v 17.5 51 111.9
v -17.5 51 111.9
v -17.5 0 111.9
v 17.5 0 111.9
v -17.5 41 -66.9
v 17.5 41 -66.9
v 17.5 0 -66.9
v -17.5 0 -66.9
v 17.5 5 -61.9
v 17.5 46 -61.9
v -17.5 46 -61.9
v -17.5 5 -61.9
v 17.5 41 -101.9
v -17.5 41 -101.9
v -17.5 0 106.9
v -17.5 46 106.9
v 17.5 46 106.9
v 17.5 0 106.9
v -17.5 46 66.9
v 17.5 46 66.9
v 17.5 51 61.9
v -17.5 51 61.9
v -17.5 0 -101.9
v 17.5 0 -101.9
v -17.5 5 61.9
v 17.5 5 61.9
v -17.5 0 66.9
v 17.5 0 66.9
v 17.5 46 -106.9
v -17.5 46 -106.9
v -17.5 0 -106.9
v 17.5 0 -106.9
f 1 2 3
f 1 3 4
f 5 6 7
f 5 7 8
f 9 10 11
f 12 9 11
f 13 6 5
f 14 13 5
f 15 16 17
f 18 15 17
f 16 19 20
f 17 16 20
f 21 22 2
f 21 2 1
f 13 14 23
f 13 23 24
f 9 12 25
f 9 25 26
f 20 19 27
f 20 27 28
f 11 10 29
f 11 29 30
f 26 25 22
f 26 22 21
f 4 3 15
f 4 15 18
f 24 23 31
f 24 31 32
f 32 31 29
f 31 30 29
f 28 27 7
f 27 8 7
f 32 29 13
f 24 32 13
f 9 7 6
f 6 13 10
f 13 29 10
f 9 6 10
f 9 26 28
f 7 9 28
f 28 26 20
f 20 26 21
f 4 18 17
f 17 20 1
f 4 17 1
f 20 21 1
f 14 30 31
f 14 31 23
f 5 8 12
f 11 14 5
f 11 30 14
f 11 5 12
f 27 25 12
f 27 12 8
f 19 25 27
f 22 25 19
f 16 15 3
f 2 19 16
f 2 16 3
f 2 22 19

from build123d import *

# Parameters (mm, degrees)
SKETCH_1_W       = 35
SKETCH_1_H       = 123.8
EXTRUDE_1_DEPTH  = 5
SKETCH_2_W       = 35
SKETCH_2_H       = 41
EXTRUDE_3_DEPTH  = 5
SKETCH_3_W       = 35
SKETCH_3_H       = 5
EXTRUDE_4_DEPTH  = 5
SKETCH_4_W       = 35
SKETCH_4_H       = 5
EXTRUDE_5_DEPTH  = 40
SKETCH_5_W       = 35
SKETCH_5_H       = 5
EXTRUDE_6_DEPTH  = 41
SKETCH_8_W       = 35
SKETCH_8_H       = 5
EXTRUDE_7_DEPTH  = 5
SKETCH_12_W      = 35
SKETCH_12_H      = 5
EXTRUDE_8_DEPTH  = 46
SKETCH_13_W      = 35
SKETCH_13_H      = 5
EXTRUDE_9_DEPTH  = 45
SKETCH_14_W      = 35
SKETCH_14_H      = 5
EXTRUDE_10_DEPTH = 46


with BuildPart() as part:
    # 草圖1 → 填料-伸長1 (new body)
    with BuildSketch(Plane(origin=(0, 0, 0), x_dir=(1, 0, 0), z_dir=(0, 1, 0))):
        Rectangle(SKETCH_1_W, SKETCH_1_H)
    extrude(amount=EXTRUDE_1_DEPTH)



with BuildPart() as body_2:
    # 草圖2 → 填料-伸長3 (new body)
    with BuildSketch(Plane(origin=(0, 0, -61.9), x_dir=(-1, 0, 0), z_dir=(0, 0, -1))):
        with Locations((0, 25.5)):
            Rectangle(SKETCH_2_W, SKETCH_2_H)
    extrude(amount=EXTRUDE_3_DEPTH)


with BuildPart() as part_1:
    add(part.part)

    add(body_2.part)  # 填料-伸長4 merges body 2
    # 草圖3 → 填料-伸長4 (add)
    with BuildSketch(Plane(origin=(0, 0, -61.9), x_dir=(-1, 0, 0), z_dir=(0, 0, -1))):
        with Locations((0, 2.5)):
            Rectangle(SKETCH_3_W, SKETCH_3_H)
    extrude(amount=EXTRUDE_4_DEPTH)

    # 草圖4 → 填料-伸長5 (add)
    with BuildSketch(Plane(origin=(0, 0, -66.9), x_dir=(-1, 0, 0), z_dir=(0, 0, -1))):
        with Locations((0, 43.5)):
            Rectangle(SKETCH_4_W, SKETCH_4_H)
    extrude(amount=EXTRUDE_5_DEPTH)

    # 草圖5 → 填料-伸長6 (add)
    with BuildSketch(Plane.XZ.offset(-41)):
        with Locations((0, -104.4)):
            Rectangle(SKETCH_5_W, SKETCH_5_H)
    extrude(amount=EXTRUDE_6_DEPTH)

    # 草圖8 → 填料-伸長7 (add)
    with BuildSketch(Plane.XY.offset(61.9)):
        with Locations((0, 2.5)):
            Rectangle(SKETCH_8_W, SKETCH_8_H)
    extrude(amount=EXTRUDE_7_DEPTH)

    # 草圖12 → 填料-伸長8 (add)
    with BuildSketch(Plane(origin=(0, 5, 0), x_dir=(1, 0, 0), z_dir=(0, 1, 0))):
        with Locations((0, -64.4)):
            Rectangle(SKETCH_12_W, SKETCH_12_H)
    extrude(amount=EXTRUDE_8_DEPTH)

    # 草圖13 → 填料-伸長9 (add)
    with BuildSketch(Plane.XY.offset(66.9)):
        with Locations((0, 48.5)):
            Rectangle(SKETCH_13_W, SKETCH_13_H)
    extrude(amount=EXTRUDE_9_DEPTH)

    # 草圖14 → 填料-伸長10 (add)
    with BuildSketch(Plane.XZ.offset(-46)):
        with Locations((0, 109.4)):
            Rectangle(SKETCH_14_W, SKETCH_14_H)
    extrude(amount=EXTRUDE_10_DEPTH)


solid = part_1.part
